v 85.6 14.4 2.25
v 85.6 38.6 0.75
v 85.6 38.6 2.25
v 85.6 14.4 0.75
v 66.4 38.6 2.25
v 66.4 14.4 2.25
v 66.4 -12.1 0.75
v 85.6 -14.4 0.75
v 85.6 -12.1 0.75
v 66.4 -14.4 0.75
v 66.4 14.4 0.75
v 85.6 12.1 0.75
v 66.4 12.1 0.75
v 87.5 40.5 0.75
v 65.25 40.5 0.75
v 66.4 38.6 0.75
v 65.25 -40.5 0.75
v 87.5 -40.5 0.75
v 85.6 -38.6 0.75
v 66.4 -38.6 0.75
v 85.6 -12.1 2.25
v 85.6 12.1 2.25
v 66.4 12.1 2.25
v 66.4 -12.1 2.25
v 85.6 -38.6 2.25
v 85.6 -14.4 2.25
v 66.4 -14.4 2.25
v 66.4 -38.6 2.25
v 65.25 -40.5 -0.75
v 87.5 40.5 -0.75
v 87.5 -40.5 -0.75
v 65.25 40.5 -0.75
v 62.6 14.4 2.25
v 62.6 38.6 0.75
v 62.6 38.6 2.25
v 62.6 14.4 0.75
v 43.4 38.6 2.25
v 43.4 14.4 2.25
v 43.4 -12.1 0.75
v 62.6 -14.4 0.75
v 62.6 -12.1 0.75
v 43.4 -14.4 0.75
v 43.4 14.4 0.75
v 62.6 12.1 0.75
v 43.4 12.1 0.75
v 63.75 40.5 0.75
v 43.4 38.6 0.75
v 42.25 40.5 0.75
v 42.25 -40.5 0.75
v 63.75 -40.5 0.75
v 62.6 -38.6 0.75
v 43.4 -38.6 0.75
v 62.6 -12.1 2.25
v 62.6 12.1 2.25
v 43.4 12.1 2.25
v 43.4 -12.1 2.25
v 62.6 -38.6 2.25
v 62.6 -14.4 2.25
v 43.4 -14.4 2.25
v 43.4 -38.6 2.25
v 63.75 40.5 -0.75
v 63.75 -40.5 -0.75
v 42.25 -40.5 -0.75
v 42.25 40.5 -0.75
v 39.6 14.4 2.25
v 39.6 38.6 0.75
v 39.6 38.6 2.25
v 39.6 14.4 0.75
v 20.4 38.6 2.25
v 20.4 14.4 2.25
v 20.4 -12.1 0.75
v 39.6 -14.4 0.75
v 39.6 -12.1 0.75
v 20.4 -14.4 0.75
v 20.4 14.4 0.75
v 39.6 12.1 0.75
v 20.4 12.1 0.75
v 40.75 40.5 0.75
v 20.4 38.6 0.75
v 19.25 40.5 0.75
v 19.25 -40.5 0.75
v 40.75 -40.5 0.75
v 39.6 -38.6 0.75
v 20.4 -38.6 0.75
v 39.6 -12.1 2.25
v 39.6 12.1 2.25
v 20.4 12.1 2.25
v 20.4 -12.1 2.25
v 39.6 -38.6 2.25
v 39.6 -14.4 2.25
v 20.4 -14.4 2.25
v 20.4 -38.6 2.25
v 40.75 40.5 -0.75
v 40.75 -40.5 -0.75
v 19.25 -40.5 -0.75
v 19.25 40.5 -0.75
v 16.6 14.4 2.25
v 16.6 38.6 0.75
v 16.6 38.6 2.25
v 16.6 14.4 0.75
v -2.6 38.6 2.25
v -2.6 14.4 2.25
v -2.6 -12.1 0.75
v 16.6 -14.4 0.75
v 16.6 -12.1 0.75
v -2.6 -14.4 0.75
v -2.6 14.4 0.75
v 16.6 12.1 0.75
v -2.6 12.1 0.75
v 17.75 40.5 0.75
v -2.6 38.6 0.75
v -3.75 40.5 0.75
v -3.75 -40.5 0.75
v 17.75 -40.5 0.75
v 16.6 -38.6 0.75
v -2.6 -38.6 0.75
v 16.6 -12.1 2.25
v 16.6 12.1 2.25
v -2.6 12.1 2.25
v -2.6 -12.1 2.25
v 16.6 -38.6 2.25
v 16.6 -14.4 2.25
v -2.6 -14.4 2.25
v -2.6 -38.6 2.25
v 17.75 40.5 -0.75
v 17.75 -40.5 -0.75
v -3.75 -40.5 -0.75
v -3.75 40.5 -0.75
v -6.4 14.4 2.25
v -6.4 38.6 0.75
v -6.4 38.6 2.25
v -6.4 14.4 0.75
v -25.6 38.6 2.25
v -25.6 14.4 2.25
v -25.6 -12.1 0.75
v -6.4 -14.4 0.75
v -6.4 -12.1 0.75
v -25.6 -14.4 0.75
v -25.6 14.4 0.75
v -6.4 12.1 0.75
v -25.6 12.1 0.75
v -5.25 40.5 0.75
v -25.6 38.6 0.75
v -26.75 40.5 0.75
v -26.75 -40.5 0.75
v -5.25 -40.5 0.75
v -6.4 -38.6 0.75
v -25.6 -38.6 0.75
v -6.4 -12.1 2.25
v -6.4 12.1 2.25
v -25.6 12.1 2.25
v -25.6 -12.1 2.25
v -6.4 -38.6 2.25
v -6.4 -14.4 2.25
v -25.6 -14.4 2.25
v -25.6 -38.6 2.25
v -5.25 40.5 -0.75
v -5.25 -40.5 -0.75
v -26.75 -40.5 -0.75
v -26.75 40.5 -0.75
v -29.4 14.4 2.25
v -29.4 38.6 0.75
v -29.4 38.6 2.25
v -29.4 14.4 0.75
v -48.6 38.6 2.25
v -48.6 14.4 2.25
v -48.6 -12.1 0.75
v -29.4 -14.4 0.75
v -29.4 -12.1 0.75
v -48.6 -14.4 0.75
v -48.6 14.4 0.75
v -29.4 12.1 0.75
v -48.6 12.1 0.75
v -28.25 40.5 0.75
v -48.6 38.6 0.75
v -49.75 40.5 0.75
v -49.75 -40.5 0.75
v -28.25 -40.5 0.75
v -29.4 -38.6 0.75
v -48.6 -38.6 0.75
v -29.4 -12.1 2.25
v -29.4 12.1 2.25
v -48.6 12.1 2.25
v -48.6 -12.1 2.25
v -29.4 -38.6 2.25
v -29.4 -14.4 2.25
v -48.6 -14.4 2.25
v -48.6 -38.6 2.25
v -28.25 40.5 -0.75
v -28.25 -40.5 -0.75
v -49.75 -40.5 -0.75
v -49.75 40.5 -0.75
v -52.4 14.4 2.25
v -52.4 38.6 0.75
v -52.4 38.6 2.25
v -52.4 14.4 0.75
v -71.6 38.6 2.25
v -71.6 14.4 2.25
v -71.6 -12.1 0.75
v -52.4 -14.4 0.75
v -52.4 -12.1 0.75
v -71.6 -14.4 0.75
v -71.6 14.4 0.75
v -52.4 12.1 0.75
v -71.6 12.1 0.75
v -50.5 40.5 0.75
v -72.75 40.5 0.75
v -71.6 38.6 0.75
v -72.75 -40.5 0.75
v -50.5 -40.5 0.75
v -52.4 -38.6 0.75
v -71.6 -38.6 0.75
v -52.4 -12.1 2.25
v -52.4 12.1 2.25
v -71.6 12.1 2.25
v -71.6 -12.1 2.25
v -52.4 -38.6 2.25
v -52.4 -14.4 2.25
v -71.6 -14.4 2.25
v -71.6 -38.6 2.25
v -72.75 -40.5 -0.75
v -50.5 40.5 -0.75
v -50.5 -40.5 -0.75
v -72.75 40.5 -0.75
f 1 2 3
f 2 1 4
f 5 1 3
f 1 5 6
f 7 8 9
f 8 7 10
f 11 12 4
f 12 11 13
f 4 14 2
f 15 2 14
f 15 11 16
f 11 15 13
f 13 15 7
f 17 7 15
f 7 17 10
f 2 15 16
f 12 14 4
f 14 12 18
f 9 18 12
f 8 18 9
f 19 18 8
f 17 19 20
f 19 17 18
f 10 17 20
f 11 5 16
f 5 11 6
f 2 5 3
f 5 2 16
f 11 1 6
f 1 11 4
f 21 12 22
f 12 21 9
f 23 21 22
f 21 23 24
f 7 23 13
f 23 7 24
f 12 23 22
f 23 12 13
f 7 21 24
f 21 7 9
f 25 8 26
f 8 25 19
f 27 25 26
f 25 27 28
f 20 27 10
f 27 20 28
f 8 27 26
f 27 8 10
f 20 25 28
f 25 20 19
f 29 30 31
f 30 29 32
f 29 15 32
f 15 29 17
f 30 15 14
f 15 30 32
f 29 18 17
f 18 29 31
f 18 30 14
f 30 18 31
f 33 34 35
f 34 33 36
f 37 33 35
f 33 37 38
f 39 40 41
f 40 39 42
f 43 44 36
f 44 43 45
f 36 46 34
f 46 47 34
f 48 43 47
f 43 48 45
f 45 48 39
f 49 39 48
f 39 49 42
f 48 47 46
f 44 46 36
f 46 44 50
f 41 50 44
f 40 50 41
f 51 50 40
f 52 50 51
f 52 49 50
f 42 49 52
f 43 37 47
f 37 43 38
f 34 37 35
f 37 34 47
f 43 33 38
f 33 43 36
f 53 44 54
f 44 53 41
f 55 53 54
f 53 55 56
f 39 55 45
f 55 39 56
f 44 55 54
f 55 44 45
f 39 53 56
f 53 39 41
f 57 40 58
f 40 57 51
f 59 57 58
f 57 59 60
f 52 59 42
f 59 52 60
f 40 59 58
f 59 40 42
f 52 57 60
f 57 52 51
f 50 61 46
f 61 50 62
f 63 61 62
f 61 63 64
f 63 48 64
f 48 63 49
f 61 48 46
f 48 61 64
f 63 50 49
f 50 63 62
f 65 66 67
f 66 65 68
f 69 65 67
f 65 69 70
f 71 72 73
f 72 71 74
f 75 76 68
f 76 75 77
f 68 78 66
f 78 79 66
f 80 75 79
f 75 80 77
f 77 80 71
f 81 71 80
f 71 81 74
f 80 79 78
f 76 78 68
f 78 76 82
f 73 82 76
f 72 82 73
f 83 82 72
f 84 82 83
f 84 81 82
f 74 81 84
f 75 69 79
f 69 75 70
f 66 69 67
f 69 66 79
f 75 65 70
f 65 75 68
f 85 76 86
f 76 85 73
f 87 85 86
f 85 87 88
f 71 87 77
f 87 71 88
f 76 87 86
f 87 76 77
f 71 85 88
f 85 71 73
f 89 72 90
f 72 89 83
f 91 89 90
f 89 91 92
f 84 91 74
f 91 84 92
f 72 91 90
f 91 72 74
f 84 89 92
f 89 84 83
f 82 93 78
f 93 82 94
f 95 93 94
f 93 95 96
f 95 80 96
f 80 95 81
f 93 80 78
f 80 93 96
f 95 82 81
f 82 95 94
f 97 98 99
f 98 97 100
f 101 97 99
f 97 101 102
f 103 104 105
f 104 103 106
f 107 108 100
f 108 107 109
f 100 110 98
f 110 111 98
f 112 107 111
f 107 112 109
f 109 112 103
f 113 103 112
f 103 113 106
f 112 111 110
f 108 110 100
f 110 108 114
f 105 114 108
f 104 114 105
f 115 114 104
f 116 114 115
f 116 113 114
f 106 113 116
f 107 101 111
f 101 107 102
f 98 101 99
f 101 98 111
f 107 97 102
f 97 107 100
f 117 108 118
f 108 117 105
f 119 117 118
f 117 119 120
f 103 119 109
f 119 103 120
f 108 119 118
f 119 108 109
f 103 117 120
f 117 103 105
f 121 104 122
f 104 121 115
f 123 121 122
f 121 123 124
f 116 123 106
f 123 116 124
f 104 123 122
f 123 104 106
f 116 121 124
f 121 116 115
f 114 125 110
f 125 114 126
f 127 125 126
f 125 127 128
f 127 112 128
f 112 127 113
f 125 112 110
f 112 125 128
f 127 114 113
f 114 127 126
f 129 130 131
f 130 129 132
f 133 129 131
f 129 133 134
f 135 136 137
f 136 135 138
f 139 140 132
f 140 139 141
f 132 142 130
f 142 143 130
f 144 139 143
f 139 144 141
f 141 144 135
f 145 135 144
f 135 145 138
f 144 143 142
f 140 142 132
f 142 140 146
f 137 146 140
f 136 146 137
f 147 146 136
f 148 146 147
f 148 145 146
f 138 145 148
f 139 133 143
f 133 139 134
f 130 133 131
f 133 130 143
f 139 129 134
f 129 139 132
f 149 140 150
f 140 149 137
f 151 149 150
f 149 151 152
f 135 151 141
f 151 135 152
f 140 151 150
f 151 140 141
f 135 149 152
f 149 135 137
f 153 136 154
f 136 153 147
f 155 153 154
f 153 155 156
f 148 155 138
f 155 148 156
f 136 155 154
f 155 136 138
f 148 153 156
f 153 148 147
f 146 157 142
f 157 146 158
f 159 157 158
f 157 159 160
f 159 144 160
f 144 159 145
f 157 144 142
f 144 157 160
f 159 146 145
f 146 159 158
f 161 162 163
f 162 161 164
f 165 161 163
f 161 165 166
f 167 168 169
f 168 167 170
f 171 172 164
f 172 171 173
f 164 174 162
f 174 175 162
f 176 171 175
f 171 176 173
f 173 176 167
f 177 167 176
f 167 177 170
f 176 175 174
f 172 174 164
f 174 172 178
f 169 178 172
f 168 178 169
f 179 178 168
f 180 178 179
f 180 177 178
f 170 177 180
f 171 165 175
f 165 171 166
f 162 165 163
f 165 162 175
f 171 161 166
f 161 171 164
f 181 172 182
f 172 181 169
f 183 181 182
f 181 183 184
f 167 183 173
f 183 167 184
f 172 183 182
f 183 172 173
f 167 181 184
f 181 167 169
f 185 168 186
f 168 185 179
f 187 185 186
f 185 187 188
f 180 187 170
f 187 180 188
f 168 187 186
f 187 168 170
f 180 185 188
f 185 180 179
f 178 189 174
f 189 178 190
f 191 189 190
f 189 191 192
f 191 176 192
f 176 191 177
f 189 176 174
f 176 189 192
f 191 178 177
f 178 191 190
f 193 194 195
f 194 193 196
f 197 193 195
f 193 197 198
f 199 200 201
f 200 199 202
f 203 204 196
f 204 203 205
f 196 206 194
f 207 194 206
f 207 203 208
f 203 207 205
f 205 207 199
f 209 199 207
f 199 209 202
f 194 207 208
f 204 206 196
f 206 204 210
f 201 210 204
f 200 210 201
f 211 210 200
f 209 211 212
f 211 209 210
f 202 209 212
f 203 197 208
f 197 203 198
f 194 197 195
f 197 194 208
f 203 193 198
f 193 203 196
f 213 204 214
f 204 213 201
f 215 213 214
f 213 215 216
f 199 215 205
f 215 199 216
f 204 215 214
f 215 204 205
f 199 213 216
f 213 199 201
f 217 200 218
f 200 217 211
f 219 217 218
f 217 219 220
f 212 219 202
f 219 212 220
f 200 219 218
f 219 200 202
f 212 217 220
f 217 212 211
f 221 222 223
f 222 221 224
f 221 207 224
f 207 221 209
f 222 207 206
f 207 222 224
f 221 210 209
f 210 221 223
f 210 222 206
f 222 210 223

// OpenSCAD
// file: config.scad
// Config for the model

COLUMNS = 7;
ROWS = 3;
CELL_WIDTH = 20;
CELL_HEIGHT = 20;
CELL_DEPTH = 25;
BORDER_SIZE = 1.5;  // This also controls ceilings and floors.
ERROR_MARGIN = 0.4; // Printer error margin.

// Do not touch anything after this.

container_width = (CELL_WIDTH+BORDER_SIZE)*COLUMNS + BORDER_SIZE;
container_depth = (CELL_DEPTH+BORDER_SIZE)*ROWS + BORDER_SIZE;
container_height = CELL_HEIGHT + BORDER_SIZE;
// main file
include <config.scad>

for (i = [0:COLUMNS - 1]) {
  pos_x = container_width/2 - i*(CELL_WIDTH + BORDER_SIZE*2);
  translate([pos_x, 0, 0]) {
    cover(extra = (i == 0 || i == COLUMNS - 1));
  }
}

// extra: controls whether some extra size has to be include in the lateral
//        portion of the cover to fit on the sides.
module cover(extra = false) {
  cover_width = CELL_WIDTH + BORDER_SIZE;
  cube([cover_width, container_depth, BORDER_SIZE], center = true);
  for (i = [0:ROWS-1]) {
    cover_slot_y = container_depth/2 - (CELL_DEPTH + BORDER_SIZE)*i - CELL_DEPTH/2 - BORDER_SIZE;
    translate([0, cover_slot_y, BORDER_SIZE])
      cube([CELL_WIDTH - ERROR_MARGIN*2, CELL_DEPTH - ERROR_MARGIN*2, BORDER_SIZE], center = true);
  }
  cover_extra_x = (cover_width + BORDER_SIZE/2)/2;
  translate([extra ? cover_extra_x : 0, 0, 0])
    cube([BORDER_SIZE/2, container_depth, BORDER_SIZE], center = true);
}
